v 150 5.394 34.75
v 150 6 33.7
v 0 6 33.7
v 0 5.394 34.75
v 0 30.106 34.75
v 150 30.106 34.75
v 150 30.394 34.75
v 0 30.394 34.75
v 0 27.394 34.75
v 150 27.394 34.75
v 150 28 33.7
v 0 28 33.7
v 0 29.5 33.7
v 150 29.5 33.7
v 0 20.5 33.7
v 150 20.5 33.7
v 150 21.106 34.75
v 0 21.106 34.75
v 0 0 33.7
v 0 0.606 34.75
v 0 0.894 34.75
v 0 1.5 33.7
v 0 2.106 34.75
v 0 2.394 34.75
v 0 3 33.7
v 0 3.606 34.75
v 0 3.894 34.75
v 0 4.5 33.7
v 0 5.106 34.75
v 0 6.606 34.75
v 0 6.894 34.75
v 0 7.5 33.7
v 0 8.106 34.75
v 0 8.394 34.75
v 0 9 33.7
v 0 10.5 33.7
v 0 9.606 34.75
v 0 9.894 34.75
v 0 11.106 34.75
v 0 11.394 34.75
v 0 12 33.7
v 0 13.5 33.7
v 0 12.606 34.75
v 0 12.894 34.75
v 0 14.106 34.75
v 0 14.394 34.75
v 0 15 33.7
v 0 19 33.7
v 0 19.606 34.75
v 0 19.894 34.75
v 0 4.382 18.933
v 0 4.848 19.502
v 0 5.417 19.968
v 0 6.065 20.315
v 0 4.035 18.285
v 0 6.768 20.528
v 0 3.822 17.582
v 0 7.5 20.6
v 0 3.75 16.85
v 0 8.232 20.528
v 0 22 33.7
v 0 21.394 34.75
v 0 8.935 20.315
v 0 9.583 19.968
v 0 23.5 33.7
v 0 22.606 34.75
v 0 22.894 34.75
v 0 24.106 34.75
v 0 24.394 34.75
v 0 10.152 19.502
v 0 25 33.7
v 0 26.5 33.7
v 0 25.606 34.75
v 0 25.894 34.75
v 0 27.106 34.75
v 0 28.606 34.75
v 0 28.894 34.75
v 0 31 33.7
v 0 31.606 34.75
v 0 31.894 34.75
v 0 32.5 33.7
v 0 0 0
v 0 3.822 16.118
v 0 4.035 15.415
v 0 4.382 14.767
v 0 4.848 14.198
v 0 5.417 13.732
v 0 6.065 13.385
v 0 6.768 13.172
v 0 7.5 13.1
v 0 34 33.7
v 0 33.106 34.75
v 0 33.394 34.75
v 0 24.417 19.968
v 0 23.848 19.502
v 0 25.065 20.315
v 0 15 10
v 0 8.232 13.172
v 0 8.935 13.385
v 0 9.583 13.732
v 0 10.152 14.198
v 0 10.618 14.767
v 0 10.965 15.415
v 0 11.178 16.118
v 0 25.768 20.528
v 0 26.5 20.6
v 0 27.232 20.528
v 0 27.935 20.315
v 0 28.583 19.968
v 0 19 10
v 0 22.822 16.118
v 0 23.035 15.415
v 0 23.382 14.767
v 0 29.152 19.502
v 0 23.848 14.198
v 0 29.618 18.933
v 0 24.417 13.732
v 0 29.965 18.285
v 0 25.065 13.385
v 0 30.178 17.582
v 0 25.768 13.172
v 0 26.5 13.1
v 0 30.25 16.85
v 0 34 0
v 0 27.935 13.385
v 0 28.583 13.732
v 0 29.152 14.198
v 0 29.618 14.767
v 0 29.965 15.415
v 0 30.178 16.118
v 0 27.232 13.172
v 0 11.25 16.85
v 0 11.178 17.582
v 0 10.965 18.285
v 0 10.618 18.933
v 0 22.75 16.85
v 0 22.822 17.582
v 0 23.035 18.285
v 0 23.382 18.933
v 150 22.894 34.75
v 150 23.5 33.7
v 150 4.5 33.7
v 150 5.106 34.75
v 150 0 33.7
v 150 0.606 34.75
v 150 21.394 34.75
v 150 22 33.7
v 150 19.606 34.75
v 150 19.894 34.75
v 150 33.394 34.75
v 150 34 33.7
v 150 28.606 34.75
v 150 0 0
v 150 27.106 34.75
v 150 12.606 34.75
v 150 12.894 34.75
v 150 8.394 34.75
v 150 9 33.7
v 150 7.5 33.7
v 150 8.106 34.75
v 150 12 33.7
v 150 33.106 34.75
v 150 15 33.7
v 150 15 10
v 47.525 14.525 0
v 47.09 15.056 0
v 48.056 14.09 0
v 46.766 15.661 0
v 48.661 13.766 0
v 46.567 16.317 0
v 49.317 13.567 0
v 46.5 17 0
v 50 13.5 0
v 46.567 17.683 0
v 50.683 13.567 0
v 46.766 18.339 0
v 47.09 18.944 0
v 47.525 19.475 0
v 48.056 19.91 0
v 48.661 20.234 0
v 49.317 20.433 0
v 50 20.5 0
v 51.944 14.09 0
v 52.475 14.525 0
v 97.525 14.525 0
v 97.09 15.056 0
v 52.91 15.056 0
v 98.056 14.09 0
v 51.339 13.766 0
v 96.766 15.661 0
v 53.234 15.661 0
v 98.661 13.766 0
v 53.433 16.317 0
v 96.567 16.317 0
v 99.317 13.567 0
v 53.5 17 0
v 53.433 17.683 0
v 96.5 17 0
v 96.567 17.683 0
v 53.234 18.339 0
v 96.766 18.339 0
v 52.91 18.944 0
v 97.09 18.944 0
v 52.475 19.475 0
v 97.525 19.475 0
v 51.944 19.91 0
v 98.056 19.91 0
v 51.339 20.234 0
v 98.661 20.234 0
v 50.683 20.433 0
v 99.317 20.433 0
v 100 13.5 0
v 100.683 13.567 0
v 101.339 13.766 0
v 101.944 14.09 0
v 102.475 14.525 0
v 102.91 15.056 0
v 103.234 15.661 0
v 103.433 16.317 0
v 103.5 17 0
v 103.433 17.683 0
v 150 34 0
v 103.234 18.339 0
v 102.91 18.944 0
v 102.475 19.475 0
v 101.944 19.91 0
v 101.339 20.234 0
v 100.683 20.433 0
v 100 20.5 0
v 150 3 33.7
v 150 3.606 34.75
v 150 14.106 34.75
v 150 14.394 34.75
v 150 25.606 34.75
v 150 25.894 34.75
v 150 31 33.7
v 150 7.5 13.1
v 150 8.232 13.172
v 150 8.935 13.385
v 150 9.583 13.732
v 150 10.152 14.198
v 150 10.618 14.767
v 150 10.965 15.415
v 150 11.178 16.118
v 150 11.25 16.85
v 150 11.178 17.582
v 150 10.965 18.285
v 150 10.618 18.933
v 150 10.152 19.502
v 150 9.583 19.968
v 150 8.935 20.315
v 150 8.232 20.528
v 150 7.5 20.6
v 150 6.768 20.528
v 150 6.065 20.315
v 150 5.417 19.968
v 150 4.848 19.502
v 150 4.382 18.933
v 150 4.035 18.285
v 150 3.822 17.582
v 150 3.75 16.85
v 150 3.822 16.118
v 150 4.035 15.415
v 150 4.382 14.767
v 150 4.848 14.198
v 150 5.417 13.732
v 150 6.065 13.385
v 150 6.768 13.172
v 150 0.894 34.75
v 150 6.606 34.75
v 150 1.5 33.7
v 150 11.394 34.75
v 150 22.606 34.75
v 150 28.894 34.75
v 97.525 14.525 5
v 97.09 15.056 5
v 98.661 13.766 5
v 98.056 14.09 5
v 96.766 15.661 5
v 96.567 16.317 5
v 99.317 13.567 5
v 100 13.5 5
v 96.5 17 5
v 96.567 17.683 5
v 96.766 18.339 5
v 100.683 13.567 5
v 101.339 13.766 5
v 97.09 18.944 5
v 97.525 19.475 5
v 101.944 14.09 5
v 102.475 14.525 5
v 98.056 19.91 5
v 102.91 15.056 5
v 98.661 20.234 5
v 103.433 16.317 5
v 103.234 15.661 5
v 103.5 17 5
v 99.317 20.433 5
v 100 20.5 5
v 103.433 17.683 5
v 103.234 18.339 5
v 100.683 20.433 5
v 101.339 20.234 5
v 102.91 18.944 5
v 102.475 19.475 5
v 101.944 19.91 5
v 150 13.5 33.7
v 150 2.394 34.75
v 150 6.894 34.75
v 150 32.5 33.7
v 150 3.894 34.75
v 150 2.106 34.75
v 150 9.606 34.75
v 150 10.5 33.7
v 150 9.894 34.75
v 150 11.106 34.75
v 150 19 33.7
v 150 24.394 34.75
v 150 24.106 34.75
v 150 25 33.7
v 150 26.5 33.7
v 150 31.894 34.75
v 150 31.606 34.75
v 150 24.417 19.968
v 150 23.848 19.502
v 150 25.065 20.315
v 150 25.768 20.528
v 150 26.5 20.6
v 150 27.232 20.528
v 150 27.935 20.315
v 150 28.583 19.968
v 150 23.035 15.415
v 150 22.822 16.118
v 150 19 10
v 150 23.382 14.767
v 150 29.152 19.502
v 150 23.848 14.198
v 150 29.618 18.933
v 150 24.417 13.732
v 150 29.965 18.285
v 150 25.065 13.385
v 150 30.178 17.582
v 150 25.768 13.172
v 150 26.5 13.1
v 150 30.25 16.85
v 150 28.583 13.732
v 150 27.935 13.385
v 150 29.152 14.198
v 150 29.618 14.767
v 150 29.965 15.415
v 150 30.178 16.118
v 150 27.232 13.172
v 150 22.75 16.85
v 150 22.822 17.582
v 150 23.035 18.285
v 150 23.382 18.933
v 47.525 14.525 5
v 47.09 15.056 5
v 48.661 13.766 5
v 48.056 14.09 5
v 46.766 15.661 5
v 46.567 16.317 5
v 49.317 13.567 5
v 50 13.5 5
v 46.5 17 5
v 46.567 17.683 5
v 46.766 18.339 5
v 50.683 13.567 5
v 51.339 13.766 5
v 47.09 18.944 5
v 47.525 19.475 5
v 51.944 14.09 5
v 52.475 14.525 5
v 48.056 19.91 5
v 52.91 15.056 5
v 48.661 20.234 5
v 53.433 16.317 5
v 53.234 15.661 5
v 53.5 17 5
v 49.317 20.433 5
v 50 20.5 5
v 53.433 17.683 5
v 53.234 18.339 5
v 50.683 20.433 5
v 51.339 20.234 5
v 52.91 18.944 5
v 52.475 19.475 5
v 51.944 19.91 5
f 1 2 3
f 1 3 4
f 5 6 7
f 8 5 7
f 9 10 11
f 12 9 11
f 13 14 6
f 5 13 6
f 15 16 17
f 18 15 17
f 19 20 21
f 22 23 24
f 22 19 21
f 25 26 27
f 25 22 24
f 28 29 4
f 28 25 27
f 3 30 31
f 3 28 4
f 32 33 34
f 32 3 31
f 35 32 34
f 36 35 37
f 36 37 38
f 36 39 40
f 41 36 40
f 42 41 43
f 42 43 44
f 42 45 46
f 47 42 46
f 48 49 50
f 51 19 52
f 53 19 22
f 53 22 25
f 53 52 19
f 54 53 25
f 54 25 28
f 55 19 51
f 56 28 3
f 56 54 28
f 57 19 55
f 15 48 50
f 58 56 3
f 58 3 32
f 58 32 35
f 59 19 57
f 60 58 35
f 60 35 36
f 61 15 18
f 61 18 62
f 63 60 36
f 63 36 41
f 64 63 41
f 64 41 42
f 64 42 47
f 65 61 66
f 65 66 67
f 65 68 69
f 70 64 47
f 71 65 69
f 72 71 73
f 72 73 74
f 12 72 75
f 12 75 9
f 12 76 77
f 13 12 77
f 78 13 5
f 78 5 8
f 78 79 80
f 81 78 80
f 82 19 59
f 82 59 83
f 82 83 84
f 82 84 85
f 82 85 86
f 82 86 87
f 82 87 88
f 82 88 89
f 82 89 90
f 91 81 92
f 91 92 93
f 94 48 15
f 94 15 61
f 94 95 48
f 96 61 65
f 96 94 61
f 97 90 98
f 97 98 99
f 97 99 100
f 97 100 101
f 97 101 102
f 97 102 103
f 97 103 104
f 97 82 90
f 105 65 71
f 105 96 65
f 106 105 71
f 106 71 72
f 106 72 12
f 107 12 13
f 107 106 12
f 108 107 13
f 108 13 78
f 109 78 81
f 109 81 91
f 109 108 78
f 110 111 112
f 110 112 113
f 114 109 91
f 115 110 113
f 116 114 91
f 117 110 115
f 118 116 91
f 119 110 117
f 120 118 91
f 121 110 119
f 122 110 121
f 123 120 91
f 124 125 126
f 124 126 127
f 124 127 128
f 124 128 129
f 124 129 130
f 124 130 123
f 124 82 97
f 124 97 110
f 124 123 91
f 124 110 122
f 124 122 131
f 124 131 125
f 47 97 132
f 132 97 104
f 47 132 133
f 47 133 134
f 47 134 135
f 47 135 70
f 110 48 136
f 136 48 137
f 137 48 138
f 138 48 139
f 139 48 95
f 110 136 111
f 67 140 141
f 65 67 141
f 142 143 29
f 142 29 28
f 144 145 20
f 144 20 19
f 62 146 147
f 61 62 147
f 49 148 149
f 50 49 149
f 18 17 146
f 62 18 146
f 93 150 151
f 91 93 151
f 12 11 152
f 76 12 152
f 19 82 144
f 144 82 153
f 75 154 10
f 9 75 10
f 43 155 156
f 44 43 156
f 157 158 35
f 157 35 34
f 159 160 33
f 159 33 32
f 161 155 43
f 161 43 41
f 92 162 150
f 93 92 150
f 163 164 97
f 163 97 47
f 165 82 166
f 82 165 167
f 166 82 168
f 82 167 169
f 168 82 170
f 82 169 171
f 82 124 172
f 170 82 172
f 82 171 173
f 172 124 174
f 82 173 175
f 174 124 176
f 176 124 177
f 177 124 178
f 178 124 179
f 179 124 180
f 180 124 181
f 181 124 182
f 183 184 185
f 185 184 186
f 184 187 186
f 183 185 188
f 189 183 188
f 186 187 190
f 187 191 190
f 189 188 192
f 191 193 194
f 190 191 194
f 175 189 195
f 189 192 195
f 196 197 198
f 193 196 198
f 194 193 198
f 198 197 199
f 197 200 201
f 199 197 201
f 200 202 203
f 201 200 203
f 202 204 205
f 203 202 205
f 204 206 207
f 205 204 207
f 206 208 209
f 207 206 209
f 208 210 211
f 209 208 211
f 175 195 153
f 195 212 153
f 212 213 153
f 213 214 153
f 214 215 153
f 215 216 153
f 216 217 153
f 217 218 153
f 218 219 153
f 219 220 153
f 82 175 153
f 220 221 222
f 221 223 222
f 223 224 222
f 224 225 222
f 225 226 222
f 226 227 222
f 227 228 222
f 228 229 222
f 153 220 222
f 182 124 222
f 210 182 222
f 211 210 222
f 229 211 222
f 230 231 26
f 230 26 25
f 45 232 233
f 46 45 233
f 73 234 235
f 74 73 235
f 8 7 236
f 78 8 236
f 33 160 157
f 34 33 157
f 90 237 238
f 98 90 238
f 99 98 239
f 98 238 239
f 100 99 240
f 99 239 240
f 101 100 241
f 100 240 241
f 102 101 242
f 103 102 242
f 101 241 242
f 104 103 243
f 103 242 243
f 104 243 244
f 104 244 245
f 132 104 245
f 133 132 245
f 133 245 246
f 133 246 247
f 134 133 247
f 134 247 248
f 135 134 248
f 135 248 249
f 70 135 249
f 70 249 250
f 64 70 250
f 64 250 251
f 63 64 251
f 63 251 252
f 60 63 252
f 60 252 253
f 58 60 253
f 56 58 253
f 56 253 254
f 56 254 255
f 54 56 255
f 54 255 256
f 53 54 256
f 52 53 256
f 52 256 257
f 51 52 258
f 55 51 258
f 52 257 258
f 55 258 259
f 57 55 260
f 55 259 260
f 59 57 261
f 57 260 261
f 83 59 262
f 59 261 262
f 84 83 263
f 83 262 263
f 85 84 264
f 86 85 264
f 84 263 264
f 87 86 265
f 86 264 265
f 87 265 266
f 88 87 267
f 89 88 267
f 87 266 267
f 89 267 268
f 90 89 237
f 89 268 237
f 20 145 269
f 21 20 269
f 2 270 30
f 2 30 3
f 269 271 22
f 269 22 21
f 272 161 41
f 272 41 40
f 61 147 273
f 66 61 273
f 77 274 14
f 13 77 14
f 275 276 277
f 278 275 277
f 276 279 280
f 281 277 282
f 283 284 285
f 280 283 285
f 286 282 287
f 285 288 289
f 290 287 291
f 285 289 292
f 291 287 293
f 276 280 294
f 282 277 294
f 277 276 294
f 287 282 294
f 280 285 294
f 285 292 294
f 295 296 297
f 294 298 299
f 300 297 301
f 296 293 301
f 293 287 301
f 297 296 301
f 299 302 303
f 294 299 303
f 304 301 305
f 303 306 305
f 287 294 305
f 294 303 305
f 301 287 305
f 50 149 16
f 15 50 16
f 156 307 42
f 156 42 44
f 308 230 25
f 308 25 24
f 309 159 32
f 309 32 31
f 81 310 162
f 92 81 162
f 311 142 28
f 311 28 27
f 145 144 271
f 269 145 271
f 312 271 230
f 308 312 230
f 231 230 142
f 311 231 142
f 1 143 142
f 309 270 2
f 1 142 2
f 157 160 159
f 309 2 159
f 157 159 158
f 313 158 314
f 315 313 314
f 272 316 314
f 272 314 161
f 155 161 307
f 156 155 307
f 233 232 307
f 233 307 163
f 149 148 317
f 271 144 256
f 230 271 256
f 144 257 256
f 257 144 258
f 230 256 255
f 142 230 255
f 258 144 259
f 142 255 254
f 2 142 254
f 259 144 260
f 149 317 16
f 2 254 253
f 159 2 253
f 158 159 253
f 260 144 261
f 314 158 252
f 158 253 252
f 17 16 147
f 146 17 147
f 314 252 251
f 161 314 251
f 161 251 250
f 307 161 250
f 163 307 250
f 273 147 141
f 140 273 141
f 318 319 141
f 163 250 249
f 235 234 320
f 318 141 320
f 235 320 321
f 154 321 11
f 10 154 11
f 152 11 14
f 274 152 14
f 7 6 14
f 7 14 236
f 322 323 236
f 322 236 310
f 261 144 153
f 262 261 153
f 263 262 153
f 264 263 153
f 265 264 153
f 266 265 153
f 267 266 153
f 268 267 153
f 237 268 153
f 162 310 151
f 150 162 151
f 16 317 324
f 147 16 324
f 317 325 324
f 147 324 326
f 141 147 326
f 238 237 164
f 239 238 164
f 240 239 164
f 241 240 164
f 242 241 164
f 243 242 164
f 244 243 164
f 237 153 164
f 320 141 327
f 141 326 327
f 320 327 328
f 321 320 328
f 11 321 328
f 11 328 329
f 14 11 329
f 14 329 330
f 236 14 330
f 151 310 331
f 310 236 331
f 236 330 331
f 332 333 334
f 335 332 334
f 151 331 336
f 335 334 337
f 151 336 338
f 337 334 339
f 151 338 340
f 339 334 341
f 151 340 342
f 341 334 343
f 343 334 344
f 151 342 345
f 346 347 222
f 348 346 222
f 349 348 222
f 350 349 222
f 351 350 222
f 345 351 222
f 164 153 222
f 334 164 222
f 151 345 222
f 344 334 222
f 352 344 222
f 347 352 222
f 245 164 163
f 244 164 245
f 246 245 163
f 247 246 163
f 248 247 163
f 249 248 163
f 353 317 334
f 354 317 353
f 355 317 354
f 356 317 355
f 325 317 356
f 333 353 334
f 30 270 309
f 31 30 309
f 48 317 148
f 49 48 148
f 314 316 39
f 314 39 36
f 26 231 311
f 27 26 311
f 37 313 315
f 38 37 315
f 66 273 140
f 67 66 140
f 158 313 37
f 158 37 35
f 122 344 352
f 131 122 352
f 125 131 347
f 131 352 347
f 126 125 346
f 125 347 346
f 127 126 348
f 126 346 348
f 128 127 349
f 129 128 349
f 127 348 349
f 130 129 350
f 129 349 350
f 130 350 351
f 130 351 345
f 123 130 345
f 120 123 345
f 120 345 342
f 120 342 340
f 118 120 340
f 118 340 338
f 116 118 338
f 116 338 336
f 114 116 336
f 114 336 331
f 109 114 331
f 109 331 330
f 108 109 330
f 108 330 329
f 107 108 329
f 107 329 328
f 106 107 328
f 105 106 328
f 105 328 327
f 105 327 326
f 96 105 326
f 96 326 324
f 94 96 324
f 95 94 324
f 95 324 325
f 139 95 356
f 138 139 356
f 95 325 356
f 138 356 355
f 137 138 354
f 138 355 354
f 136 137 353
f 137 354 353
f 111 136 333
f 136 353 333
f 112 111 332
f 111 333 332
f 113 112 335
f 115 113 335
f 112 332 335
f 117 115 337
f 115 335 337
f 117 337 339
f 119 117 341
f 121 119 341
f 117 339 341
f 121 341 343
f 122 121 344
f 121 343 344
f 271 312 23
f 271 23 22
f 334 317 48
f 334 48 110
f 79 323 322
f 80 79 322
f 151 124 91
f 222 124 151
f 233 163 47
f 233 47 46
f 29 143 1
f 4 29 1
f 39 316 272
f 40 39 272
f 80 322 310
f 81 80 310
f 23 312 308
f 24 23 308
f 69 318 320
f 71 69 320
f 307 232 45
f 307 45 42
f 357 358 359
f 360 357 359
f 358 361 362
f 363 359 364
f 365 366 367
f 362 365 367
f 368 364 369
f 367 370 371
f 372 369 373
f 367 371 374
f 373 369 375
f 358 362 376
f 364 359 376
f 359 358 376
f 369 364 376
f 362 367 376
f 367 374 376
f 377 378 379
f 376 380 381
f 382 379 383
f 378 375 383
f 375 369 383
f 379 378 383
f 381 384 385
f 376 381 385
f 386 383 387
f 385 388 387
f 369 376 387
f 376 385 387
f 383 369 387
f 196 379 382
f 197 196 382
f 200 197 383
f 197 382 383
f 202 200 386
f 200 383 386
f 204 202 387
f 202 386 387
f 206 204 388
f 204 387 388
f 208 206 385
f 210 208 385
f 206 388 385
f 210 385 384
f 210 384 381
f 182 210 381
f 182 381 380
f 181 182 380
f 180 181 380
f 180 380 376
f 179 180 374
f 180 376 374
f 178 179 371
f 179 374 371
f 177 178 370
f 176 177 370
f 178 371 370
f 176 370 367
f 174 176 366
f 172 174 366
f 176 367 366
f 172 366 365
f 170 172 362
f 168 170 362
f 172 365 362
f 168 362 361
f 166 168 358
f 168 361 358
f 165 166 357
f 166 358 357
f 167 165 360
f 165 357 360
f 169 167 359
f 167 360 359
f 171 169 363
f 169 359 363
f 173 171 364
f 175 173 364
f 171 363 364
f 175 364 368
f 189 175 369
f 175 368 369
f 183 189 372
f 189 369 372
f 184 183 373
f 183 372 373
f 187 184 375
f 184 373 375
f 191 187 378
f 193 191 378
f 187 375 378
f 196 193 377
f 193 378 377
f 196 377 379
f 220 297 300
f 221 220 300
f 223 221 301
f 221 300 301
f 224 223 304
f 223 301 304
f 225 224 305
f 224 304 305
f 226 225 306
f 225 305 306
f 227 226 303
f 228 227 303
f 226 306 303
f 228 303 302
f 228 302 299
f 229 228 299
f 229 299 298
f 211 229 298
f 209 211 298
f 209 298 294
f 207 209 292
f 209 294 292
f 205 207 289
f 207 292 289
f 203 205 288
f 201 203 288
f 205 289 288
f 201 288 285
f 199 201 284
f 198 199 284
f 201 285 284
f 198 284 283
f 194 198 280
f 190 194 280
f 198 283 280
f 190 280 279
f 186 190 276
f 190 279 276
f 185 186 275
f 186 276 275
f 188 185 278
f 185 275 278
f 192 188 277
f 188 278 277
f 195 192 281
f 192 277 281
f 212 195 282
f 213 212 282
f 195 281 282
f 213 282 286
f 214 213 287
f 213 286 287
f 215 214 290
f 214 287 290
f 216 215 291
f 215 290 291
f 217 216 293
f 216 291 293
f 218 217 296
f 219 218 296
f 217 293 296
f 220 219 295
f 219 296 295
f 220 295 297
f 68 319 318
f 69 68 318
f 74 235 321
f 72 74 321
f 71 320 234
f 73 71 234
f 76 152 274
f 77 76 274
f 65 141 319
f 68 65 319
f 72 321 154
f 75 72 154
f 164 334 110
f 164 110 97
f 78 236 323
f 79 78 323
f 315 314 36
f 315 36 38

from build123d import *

# Parameters (mm, degrees)
SKETCH1_W           = 150
SKETCH1_H           = 34
BOSS_EXTRUDE1_DEPTH = 35
CUT_EXTRUDE1_DEPTH  = 160
CUT_EXTRUDE7_DEPTH  = 160
SKETCH6_W           = 0.25
SKETCH6_H           = 34
CUT_EXTRUDE8_DEPTH  = 160
SKETCH7_R           = 3.75
CUT_EXTRUDE9_DEPTH  = 160
CUT_EXTRUDE10_START = -5
SKETCH8_R           = 3.5
CUT_EXTRUDE10_DEPTH = 5


with BuildPart() as part:
    # Sketch1 → Boss-Extrude1 (new body)
    with BuildSketch(Plane.XY):
        with Locations((75, 17)):
            Rectangle(SKETCH1_W, SKETCH1_H)
    extrude(amount=BOSS_EXTRUDE1_DEPTH)

    # Sketch2 → Cut-Extrude1 (cut)
    with BuildSketch(Plane(origin=(150, 0, 0), x_dir=(0, 0, -1), z_dir=(1, 0, 0))):
        Polygon((-35, 17), (-35, 19), (-10, 19), (-10, 15), (-35, 15), align=None)
    extrude(amount=-CUT_EXTRUDE1_DEPTH, mode=Mode.SUBTRACT)

    # Sketch3 → Cut-Extrude7 (cut)
    with BuildSketch(Plane(origin=(150, 0, 0), x_dir=(0, 0, -1), z_dir=(1, 0, 0))):
        Polygon((-33.7, 19), (-35, 19.75), (-35, 18.25), align=None)
        Polygon((-33.7, 20.5), (-35, 21.25), (-35, 19.75), align=None)
        Polygon((-33.7, 22), (-35, 22.75), (-35, 21.25), align=None)
        Polygon((-33.7, 23.5), (-35, 24.25), (-35, 22.75), align=None)
        Polygon((-33.7, 25), (-35, 25.75), (-35, 24.25), align=None)
        Polygon((-33.7, 26.5), (-35, 27.25), (-35, 25.75), align=None)
        Polygon((-33.7, 28), (-35, 28.75), (-35, 27.25), align=None)
        Polygon((-33.7, 29.5), (-35, 30.25), (-35, 28.75), align=None)
        Polygon((-35, 34), (-35, 33.25), (-33.7, 34), align=None)
        Polygon((-35, 33.25), (-35, 31.75), (-33.7, 32.5), align=None)
        Polygon((-33.7, 31), (-35, 31.75), (-35, 30.25), align=None)
    cut_extrude7 = extrude(amount=-CUT_EXTRUDE7_DEPTH, mode=Mode.SUBTRACT)

    # Mirror1: Cut-Extrude7 across plane
    add(cut_extrude7.mirror(Plane.ZX.offset(17)), mode=Mode.SUBTRACT)

    # Sketch6 → Cut-Extrude8 (cut)
    with BuildSketch(Plane(origin=(150, 0, 0), x_dir=(0, 0, -1), z_dir=(1, 0, 0))):
        with Locations((-34.875, 17)):
            Rectangle(SKETCH6_W, SKETCH6_H)
    extrude(amount=-CUT_EXTRUDE8_DEPTH, mode=Mode.SUBTRACT)

    # Sketch7 → Cut-Extrude9 (cut)
    with BuildSketch(Plane(origin=(150, 0, 0), x_dir=(0, 0, -1), z_dir=(1, 0, 0))):
        with Locations((-16.85, 26.5)):
            Circle(SKETCH7_R)
        with Locations((-16.85, 7.5)):
            Circle(SKETCH7_R)
    extrude(amount=-CUT_EXTRUDE9_DEPTH, mode=Mode.SUBTRACT)

    # Sketch8 → Cut-Extrude10 (cut)
    with BuildSketch(Plane.XY.offset(10).offset(CUT_EXTRUDE10_START)):
        with Locations((100, 17)):
            Circle(SKETCH8_R)
        with Locations((50, 17)):
            Circle(SKETCH8_R)
    extrude(amount=-CUT_EXTRUDE10_DEPTH, mode=Mode.SUBTRACT)


solid = part.part
